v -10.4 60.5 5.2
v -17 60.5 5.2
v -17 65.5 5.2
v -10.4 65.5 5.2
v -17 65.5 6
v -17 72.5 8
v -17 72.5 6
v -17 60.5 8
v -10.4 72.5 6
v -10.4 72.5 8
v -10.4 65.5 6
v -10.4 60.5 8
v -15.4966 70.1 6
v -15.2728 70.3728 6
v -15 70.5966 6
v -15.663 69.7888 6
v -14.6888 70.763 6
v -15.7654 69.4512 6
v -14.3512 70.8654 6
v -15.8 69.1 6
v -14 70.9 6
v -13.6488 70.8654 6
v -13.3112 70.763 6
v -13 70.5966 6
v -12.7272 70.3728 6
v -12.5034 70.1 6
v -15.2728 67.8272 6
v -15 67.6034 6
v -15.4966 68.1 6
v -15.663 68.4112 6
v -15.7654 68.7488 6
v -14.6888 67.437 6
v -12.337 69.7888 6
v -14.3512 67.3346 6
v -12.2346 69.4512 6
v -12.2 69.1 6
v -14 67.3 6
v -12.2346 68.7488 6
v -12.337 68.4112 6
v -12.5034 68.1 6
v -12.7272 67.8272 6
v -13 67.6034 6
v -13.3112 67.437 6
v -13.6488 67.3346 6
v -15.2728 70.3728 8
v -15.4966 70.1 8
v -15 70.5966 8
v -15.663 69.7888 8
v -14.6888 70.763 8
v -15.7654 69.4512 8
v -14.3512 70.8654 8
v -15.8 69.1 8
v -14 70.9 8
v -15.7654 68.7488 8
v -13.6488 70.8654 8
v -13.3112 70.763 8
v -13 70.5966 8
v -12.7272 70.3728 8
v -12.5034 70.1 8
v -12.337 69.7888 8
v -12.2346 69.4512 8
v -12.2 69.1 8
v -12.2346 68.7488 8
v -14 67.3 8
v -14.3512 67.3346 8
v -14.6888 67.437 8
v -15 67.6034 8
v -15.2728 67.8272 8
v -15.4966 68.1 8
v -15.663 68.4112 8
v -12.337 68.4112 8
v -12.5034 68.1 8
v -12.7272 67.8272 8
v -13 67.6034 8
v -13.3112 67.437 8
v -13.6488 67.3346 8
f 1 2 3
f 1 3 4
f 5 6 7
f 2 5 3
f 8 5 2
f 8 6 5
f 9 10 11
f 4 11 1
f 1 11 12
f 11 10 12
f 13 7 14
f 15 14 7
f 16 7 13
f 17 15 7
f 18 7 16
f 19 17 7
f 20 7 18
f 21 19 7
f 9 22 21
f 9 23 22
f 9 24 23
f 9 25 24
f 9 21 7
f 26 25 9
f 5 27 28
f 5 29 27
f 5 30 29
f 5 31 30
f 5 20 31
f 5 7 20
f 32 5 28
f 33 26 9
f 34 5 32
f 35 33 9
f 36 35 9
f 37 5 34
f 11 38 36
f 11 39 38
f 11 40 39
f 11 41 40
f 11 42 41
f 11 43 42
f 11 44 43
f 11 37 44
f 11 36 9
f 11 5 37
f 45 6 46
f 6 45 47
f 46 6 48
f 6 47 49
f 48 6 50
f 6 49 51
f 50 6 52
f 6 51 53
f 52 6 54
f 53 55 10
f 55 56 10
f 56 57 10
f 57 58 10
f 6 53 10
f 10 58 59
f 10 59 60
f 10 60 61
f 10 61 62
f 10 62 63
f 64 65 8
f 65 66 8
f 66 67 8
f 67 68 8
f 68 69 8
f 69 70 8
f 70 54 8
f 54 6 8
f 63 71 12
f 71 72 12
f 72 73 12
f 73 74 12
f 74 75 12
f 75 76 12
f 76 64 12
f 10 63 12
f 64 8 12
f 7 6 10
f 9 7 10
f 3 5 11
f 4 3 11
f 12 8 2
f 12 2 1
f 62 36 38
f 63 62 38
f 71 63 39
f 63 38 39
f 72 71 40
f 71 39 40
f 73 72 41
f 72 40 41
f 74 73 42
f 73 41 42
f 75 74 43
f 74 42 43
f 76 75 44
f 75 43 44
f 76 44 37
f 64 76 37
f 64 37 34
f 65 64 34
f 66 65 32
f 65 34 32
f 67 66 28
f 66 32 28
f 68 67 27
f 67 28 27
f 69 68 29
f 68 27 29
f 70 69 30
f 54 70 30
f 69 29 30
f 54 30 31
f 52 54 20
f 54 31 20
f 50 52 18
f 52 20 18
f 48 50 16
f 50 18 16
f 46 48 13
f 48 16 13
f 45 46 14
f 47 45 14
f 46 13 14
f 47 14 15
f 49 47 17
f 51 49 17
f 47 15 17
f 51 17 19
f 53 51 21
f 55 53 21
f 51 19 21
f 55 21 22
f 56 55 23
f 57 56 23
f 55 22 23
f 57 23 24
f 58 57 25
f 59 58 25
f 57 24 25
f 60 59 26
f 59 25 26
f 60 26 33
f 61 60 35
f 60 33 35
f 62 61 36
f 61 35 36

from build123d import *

# Parameters (mm, degrees)
SKETCH054_W             = 6.6
SKETCH054_H             = 12
PAD012_DEPTH            = 2
SKETCH055_W             = 6.6
SKETCH055_H             = 5
PAD013_DEPTH            = 0.8
SKETCH056_R             = 1.8
POCKET014_DEPTH         = 2
BODY005_PLACEMENT_ANGLE = 180


with BuildPart() as part:
    # Sketch054 → Pad012 (new body)
    with BuildSketch(Plane.XY):
        with Locations((3.3, 6)):
            Rectangle(SKETCH054_W, SKETCH054_H)
    extrude(amount=PAD012_DEPTH)

    # Sketch055 (on Face6 of Pad012) → Pad013 (join)
    with BuildSketch(Plane.XY.offset(2)):
        with Locations((3.3, 9.5)):
            Rectangle(SKETCH055_W, SKETCH055_H)
    extrude(amount=PAD013_DEPTH)

    # Sketch056 (on Face7 of Pad013) → Pocket014 (cut)
    with BuildSketch(Plane.XY.offset(2)):
        with Locations((3, 3.4)):
            Circle(SKETCH056_R)
    extrude(amount=-POCKET014_DEPTH, mode=Mode.SUBTRACT)


with BuildPart() as part_1:
    # Body005 placement: moved
    add(part.part.moved(Location((-17, 72.5, 8))).rotate(Axis((-17, 72.5, 8), (1, 0, 0)), BODY005_PLACEMENT_ANGLE))


solid = part_1.part
